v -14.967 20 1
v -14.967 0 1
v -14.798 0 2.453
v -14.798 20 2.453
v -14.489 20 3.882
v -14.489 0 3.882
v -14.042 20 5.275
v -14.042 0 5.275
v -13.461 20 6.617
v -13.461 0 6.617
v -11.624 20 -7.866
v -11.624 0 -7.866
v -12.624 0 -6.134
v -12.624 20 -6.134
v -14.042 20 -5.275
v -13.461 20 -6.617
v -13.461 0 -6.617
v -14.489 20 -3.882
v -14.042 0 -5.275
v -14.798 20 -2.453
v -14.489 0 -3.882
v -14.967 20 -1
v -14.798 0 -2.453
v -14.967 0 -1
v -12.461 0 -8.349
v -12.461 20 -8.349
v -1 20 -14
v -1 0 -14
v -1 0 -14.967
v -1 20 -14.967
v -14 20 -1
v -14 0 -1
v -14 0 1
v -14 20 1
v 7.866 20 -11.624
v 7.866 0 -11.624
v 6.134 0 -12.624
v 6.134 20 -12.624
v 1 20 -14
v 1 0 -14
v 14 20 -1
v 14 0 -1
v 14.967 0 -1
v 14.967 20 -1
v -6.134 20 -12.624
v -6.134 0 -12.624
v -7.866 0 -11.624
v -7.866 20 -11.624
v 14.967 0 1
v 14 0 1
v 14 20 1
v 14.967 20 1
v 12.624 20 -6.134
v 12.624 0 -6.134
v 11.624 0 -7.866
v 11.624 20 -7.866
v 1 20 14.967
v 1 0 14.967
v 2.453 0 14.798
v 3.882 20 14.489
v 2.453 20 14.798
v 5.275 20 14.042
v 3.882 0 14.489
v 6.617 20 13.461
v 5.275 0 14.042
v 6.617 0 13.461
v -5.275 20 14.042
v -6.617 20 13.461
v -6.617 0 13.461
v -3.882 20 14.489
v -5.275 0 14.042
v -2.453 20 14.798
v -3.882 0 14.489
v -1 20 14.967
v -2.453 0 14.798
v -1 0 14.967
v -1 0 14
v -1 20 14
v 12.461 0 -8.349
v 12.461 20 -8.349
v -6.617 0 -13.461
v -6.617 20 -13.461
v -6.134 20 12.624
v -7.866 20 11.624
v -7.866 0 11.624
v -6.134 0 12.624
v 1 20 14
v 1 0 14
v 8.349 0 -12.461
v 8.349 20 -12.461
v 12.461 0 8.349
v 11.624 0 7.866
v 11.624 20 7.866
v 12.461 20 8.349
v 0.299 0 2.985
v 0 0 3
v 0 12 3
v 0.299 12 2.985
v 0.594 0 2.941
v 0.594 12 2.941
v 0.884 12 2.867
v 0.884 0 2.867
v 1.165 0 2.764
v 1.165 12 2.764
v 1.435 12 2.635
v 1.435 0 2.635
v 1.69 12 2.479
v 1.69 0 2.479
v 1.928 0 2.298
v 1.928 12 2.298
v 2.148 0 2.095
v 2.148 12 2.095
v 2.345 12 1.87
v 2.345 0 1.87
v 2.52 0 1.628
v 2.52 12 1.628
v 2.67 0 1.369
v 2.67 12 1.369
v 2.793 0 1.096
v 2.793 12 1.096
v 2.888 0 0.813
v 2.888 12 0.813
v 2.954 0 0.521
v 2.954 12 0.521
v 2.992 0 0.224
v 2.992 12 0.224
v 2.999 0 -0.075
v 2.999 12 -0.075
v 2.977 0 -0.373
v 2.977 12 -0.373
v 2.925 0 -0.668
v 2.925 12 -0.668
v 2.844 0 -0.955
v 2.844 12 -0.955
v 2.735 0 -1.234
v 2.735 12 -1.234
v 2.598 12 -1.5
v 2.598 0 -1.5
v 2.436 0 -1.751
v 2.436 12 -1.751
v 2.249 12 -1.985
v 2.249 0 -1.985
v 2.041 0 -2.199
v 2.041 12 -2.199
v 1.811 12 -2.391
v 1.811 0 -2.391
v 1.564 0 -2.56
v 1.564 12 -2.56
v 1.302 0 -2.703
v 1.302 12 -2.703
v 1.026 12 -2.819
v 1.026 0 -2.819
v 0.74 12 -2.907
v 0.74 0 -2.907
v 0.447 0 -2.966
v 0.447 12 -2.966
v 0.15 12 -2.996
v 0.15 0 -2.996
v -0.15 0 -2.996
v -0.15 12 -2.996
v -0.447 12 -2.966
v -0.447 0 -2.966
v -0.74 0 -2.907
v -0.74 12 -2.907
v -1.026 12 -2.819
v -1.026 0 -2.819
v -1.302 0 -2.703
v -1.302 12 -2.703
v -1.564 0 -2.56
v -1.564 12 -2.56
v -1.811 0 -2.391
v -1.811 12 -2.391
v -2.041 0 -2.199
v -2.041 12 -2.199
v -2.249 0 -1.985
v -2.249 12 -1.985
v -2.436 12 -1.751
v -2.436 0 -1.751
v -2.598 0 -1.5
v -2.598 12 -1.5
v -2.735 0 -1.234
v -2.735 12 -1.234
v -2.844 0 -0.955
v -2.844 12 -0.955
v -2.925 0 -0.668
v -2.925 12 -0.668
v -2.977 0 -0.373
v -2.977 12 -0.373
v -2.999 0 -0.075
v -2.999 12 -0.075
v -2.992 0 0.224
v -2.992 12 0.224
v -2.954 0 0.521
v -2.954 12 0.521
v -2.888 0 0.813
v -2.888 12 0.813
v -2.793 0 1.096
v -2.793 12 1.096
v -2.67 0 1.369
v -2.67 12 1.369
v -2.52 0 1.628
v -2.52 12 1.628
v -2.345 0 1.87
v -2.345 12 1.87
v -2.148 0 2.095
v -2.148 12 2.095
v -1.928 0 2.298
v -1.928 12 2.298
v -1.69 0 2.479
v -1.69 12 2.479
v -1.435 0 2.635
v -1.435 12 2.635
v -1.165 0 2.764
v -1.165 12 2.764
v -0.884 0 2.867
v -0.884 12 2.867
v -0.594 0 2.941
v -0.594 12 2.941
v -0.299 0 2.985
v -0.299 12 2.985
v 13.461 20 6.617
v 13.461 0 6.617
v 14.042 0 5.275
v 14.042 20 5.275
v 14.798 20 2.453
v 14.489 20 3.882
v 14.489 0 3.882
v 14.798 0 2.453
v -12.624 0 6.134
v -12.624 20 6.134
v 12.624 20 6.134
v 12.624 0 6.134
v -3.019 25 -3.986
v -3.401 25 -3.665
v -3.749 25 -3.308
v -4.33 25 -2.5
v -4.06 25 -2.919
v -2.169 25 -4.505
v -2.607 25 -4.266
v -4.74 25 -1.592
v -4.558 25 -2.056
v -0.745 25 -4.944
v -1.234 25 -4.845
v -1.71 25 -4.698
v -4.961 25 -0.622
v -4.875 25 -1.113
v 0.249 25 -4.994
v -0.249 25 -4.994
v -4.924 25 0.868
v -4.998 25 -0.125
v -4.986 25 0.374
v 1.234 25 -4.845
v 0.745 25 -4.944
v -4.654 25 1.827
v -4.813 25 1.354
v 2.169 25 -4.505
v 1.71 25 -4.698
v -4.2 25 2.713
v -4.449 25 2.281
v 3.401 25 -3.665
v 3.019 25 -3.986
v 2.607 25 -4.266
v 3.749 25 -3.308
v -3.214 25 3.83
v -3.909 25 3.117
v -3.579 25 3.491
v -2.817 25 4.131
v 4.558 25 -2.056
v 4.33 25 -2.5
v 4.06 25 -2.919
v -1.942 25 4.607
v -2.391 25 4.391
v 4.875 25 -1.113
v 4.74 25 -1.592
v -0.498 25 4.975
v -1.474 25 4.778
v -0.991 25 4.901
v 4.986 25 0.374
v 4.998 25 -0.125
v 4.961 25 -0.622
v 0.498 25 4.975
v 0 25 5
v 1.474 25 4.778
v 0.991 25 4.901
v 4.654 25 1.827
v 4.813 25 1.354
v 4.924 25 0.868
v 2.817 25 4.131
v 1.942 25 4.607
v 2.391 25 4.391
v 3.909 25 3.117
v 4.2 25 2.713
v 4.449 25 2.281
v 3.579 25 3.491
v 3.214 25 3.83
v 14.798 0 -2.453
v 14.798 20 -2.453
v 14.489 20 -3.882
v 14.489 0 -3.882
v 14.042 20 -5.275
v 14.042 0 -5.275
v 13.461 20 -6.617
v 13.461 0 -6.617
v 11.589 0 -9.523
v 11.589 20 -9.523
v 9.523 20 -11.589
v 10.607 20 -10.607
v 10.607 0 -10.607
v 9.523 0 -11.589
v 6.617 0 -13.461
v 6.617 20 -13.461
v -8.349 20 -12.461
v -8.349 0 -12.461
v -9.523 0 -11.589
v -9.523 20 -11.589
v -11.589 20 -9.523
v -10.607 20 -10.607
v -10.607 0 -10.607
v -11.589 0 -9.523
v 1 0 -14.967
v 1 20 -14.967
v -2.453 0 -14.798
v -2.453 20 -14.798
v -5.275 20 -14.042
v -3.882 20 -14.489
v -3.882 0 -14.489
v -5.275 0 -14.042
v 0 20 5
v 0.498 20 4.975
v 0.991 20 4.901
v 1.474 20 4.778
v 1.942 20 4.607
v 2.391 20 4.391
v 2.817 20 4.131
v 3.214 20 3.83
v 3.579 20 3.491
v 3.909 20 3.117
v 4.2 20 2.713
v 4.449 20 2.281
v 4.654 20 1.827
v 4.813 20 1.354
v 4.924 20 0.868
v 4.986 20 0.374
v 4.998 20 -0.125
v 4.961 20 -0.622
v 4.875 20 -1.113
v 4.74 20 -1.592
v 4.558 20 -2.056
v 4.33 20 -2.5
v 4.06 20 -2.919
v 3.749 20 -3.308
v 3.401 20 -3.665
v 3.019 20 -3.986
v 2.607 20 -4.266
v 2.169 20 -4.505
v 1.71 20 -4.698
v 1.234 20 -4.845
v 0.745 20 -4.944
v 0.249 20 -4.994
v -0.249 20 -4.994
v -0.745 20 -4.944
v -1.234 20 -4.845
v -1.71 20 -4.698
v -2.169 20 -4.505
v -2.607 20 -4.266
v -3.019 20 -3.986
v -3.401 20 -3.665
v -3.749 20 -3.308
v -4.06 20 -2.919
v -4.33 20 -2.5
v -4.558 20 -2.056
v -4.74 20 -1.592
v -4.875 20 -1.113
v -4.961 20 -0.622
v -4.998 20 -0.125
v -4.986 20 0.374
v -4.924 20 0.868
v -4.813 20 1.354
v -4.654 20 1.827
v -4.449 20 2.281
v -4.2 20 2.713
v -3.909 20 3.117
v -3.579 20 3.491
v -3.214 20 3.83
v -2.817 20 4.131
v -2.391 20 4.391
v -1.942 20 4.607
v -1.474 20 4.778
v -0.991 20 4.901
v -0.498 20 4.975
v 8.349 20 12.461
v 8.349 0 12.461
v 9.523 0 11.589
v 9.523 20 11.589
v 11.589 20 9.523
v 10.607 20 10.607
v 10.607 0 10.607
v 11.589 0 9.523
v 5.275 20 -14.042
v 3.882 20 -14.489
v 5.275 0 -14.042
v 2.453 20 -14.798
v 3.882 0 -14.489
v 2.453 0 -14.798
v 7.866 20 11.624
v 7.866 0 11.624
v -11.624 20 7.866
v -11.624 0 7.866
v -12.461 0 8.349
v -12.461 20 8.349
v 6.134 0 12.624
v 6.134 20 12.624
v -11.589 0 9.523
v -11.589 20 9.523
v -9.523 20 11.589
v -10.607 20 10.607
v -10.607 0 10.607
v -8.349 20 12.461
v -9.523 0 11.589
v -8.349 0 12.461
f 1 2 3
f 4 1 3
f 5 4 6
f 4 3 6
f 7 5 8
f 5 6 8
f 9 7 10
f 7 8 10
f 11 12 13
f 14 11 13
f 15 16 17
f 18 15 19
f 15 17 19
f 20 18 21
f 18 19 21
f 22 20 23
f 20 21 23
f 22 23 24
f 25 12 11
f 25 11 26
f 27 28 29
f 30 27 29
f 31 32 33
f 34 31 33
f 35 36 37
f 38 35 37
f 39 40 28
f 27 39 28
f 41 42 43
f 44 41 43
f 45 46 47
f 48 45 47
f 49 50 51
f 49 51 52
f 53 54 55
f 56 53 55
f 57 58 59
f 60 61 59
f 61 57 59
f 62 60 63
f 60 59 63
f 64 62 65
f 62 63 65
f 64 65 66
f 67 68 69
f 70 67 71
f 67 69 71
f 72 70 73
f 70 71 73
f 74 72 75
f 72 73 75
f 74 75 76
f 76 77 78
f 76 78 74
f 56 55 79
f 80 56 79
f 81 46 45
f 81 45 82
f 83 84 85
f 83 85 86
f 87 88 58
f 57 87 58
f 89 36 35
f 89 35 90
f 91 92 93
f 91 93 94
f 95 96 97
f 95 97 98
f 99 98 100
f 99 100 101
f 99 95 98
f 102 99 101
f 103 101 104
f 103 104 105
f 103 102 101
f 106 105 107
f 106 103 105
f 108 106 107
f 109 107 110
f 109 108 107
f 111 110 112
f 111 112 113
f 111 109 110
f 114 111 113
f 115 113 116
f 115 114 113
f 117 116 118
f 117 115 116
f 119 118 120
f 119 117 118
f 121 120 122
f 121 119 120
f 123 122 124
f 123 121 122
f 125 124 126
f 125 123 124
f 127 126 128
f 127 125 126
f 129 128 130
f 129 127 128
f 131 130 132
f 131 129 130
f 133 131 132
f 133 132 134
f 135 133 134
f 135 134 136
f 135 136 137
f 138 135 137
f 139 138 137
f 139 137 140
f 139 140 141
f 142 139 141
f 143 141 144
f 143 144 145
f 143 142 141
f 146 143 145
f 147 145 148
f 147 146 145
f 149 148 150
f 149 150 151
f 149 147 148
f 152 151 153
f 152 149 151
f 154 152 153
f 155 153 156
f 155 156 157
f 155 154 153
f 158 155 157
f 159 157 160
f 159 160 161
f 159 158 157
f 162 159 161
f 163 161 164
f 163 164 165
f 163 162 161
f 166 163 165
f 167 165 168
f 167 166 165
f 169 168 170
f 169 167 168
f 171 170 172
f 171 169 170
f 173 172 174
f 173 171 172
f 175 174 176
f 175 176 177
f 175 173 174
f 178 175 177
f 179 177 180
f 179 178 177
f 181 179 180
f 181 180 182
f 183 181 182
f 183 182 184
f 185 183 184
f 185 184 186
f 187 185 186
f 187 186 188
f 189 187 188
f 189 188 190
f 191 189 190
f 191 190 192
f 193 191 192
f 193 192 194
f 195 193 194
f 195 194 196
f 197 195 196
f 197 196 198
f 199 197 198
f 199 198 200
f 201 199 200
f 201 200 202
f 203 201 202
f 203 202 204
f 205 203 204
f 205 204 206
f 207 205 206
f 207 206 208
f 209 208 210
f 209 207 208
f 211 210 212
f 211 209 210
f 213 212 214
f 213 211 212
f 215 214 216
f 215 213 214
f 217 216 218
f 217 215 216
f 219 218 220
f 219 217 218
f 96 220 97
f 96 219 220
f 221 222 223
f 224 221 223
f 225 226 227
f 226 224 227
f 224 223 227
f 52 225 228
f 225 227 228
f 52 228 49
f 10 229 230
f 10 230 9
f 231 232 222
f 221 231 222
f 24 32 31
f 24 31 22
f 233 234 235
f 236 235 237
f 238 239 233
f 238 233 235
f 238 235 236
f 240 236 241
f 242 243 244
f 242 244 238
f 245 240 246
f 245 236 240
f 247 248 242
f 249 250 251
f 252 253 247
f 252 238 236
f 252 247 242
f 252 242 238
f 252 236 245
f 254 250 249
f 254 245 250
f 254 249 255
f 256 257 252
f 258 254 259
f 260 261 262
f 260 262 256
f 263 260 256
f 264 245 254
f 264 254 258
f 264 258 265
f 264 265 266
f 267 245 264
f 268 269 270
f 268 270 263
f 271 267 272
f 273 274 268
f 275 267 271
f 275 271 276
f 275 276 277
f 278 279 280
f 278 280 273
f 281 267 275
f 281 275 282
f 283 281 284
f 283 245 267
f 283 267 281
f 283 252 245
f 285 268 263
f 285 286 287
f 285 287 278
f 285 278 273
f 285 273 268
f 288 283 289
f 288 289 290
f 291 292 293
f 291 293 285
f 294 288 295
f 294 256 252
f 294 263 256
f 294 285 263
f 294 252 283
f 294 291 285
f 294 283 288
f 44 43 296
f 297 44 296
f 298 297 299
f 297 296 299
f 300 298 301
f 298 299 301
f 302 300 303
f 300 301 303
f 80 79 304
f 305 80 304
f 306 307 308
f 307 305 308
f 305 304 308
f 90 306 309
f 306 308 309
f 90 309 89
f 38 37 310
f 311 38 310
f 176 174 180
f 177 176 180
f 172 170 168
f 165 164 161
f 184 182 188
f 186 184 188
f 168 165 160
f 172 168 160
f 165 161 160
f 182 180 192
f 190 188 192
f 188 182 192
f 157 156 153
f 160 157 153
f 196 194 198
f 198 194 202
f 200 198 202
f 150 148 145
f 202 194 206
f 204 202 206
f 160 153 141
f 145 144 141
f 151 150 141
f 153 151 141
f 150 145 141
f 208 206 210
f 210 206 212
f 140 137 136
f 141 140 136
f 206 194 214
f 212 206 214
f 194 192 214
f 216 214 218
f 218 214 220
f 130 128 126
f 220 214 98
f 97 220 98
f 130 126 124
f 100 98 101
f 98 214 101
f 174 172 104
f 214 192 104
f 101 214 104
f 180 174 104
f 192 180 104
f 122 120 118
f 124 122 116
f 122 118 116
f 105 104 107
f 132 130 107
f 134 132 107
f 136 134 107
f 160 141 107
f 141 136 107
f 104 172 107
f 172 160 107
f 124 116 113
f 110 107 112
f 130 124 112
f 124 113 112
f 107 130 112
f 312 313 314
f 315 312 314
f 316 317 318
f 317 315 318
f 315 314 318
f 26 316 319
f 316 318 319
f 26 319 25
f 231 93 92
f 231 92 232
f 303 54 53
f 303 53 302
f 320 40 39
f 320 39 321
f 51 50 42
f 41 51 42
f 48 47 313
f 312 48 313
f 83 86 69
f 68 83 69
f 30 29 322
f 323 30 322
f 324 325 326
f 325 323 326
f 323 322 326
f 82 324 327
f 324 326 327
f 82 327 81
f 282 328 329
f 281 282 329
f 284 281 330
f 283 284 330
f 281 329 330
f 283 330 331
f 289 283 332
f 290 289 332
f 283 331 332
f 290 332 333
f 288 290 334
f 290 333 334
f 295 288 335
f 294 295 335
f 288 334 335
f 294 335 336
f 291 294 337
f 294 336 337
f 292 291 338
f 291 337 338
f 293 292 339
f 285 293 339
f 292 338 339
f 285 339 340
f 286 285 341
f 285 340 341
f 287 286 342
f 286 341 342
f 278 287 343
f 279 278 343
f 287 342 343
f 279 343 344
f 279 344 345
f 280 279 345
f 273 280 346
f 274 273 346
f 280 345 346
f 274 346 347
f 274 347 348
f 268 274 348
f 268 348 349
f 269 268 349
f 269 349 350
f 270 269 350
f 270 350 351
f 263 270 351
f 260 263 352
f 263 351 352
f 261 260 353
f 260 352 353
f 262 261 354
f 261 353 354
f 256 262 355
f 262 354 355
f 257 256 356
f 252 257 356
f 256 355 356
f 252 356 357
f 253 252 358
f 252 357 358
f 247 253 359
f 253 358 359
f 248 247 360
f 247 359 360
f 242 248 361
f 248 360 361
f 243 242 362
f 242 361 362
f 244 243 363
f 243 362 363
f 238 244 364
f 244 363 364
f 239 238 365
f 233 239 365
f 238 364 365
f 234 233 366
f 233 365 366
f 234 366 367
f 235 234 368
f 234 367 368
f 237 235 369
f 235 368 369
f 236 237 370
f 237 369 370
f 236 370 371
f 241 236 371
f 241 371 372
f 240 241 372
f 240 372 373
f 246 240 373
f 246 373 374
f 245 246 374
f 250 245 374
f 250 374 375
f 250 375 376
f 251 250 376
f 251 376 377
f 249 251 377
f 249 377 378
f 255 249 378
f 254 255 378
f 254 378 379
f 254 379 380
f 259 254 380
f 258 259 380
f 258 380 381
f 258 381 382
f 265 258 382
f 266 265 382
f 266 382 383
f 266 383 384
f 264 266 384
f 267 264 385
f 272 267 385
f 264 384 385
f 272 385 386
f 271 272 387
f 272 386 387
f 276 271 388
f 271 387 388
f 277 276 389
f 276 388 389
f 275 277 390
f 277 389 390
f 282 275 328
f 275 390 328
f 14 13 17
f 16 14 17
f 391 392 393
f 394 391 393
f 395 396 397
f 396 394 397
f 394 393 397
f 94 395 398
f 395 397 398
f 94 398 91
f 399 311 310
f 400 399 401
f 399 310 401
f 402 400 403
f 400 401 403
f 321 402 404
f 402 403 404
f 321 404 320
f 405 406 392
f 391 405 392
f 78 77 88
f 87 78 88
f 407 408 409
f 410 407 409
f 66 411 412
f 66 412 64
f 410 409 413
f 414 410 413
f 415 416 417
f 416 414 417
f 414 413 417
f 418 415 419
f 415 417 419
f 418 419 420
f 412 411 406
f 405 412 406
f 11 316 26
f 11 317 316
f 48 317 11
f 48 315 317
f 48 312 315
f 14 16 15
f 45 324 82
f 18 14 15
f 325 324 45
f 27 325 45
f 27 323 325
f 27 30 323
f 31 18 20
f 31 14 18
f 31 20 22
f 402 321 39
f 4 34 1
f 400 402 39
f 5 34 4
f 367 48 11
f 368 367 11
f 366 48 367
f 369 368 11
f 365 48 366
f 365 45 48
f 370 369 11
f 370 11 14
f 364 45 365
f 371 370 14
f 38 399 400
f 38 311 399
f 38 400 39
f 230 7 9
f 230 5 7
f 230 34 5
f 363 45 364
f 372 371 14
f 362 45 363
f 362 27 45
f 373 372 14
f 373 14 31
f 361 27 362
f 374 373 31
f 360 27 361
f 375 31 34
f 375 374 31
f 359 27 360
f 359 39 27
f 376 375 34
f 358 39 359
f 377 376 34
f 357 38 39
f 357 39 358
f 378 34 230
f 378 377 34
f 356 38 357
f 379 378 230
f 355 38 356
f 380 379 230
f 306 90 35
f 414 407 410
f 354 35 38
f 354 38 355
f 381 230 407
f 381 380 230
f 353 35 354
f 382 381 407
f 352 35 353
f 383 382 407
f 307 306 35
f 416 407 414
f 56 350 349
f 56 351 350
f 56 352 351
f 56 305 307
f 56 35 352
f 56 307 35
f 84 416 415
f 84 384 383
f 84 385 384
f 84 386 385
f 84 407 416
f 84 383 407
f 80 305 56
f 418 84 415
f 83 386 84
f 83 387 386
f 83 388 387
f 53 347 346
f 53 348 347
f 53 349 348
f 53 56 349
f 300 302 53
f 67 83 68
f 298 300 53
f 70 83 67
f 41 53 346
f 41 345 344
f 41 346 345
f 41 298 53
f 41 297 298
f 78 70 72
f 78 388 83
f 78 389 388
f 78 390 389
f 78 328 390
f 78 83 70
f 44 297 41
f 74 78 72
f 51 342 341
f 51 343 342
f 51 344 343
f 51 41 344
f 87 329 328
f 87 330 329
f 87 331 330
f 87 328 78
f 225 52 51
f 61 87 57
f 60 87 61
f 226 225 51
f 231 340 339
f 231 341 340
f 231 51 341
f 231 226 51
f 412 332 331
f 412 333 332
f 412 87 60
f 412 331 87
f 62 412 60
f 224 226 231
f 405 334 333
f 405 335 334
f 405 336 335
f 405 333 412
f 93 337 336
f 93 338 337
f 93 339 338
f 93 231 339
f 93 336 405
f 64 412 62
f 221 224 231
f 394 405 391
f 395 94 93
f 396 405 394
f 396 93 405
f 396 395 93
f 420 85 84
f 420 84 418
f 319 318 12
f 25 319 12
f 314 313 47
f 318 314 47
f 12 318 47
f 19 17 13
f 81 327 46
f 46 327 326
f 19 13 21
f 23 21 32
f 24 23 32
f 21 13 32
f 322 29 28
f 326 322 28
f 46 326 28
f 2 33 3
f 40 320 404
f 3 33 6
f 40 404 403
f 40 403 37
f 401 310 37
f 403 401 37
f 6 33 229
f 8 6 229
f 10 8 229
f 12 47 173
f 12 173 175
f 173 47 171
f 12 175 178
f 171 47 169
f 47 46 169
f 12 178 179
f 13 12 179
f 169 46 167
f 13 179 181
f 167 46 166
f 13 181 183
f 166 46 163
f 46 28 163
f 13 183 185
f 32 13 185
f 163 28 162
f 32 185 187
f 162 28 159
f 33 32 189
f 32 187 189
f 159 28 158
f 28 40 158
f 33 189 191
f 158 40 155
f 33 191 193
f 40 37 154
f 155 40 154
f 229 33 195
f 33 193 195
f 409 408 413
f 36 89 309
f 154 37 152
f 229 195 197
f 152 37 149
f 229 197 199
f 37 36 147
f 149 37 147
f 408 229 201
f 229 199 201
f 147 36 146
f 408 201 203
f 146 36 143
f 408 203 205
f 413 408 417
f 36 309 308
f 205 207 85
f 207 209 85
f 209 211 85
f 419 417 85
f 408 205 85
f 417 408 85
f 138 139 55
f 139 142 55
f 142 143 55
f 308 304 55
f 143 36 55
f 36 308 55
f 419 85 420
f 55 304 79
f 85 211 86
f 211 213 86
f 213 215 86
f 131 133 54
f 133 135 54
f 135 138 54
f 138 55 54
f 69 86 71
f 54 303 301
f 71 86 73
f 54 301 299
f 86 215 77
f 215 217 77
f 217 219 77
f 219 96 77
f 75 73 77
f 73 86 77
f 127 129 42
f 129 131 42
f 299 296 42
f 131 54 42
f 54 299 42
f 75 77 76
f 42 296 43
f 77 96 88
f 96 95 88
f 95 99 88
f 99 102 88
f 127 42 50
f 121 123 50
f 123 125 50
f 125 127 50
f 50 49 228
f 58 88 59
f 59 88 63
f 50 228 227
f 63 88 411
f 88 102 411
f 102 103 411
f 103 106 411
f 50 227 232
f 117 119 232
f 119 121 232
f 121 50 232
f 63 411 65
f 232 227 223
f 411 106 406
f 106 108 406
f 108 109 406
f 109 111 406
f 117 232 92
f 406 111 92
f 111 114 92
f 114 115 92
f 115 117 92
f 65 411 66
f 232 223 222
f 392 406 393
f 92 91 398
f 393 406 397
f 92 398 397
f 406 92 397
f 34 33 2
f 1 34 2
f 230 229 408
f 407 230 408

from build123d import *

# Parameters (mm, degrees)
SKETCH_1_R               = 15
EXTRUDE_1_DEPTH          = 20
SKETCH_2_R               = 5
EXTRUDE_2_DEPTH          = 5
SKETCH_3_W               = 2
SKETCH_3_H               = 2
CUT_EXTRUDE_1_DEPTH      = 33.787192622
PATTERN_CIRCULAR_1_COUNT = 12
SKETCH_4_R               = 3
CUT_EXTRUDE_2_DEPTH      = 12


with BuildPart() as part:
    # 草图1 → 凸台-拉伸1 (new body)
    with BuildSketch(Plane(origin=(0, 0, 0), x_dir=(1, 0, 0), z_dir=(0, 1, 0))):
        Circle(SKETCH_1_R)
    extrude(amount=EXTRUDE_1_DEPTH)

    # 草图2 → 凸台-拉伸2 (add)
    with BuildSketch(Plane(origin=(0, 20, 0), x_dir=(1, 0, 0), z_dir=(0, 1, 0))):
        Circle(SKETCH_2_R)
    extrude(amount=EXTRUDE_2_DEPTH)

    # 草图3 → 切除-拉伸1 (cut, through all)
    with BuildSketch(Plane(origin=(0, 0, 0), x_dir=(1, 0, 0), z_dir=(0, 1, 0))):
        with Locations((15, 0)):
            Rectangle(SKETCH_3_W, SKETCH_3_H)
    cut_extrude_1 = extrude(amount=CUT_EXTRUDE_1_DEPTH, mode=Mode.SUBTRACT)

    # 阵列(圆周)1: 切除-拉伸1 ×12 about axis
    pattern_circular_1_axis = Axis((0, -1.25, 0), (0, 1, 0))
    for i in range(1, PATTERN_CIRCULAR_1_COUNT):
        add(cut_extrude_1.rotate(pattern_circular_1_axis, i * 360 / PATTERN_CIRCULAR_1_COUNT), mode=Mode.SUBTRACT)

    # 草图4 → 切除-拉伸2 (cut)
    with BuildSketch(Plane(origin=(0, 0, 0), x_dir=(1, 0, 0), z_dir=(0, 1, 0))):
        Circle(SKETCH_4_R)
    extrude(amount=CUT_EXTRUDE_2_DEPTH, mode=Mode.SUBTRACT)


solid = part.part
